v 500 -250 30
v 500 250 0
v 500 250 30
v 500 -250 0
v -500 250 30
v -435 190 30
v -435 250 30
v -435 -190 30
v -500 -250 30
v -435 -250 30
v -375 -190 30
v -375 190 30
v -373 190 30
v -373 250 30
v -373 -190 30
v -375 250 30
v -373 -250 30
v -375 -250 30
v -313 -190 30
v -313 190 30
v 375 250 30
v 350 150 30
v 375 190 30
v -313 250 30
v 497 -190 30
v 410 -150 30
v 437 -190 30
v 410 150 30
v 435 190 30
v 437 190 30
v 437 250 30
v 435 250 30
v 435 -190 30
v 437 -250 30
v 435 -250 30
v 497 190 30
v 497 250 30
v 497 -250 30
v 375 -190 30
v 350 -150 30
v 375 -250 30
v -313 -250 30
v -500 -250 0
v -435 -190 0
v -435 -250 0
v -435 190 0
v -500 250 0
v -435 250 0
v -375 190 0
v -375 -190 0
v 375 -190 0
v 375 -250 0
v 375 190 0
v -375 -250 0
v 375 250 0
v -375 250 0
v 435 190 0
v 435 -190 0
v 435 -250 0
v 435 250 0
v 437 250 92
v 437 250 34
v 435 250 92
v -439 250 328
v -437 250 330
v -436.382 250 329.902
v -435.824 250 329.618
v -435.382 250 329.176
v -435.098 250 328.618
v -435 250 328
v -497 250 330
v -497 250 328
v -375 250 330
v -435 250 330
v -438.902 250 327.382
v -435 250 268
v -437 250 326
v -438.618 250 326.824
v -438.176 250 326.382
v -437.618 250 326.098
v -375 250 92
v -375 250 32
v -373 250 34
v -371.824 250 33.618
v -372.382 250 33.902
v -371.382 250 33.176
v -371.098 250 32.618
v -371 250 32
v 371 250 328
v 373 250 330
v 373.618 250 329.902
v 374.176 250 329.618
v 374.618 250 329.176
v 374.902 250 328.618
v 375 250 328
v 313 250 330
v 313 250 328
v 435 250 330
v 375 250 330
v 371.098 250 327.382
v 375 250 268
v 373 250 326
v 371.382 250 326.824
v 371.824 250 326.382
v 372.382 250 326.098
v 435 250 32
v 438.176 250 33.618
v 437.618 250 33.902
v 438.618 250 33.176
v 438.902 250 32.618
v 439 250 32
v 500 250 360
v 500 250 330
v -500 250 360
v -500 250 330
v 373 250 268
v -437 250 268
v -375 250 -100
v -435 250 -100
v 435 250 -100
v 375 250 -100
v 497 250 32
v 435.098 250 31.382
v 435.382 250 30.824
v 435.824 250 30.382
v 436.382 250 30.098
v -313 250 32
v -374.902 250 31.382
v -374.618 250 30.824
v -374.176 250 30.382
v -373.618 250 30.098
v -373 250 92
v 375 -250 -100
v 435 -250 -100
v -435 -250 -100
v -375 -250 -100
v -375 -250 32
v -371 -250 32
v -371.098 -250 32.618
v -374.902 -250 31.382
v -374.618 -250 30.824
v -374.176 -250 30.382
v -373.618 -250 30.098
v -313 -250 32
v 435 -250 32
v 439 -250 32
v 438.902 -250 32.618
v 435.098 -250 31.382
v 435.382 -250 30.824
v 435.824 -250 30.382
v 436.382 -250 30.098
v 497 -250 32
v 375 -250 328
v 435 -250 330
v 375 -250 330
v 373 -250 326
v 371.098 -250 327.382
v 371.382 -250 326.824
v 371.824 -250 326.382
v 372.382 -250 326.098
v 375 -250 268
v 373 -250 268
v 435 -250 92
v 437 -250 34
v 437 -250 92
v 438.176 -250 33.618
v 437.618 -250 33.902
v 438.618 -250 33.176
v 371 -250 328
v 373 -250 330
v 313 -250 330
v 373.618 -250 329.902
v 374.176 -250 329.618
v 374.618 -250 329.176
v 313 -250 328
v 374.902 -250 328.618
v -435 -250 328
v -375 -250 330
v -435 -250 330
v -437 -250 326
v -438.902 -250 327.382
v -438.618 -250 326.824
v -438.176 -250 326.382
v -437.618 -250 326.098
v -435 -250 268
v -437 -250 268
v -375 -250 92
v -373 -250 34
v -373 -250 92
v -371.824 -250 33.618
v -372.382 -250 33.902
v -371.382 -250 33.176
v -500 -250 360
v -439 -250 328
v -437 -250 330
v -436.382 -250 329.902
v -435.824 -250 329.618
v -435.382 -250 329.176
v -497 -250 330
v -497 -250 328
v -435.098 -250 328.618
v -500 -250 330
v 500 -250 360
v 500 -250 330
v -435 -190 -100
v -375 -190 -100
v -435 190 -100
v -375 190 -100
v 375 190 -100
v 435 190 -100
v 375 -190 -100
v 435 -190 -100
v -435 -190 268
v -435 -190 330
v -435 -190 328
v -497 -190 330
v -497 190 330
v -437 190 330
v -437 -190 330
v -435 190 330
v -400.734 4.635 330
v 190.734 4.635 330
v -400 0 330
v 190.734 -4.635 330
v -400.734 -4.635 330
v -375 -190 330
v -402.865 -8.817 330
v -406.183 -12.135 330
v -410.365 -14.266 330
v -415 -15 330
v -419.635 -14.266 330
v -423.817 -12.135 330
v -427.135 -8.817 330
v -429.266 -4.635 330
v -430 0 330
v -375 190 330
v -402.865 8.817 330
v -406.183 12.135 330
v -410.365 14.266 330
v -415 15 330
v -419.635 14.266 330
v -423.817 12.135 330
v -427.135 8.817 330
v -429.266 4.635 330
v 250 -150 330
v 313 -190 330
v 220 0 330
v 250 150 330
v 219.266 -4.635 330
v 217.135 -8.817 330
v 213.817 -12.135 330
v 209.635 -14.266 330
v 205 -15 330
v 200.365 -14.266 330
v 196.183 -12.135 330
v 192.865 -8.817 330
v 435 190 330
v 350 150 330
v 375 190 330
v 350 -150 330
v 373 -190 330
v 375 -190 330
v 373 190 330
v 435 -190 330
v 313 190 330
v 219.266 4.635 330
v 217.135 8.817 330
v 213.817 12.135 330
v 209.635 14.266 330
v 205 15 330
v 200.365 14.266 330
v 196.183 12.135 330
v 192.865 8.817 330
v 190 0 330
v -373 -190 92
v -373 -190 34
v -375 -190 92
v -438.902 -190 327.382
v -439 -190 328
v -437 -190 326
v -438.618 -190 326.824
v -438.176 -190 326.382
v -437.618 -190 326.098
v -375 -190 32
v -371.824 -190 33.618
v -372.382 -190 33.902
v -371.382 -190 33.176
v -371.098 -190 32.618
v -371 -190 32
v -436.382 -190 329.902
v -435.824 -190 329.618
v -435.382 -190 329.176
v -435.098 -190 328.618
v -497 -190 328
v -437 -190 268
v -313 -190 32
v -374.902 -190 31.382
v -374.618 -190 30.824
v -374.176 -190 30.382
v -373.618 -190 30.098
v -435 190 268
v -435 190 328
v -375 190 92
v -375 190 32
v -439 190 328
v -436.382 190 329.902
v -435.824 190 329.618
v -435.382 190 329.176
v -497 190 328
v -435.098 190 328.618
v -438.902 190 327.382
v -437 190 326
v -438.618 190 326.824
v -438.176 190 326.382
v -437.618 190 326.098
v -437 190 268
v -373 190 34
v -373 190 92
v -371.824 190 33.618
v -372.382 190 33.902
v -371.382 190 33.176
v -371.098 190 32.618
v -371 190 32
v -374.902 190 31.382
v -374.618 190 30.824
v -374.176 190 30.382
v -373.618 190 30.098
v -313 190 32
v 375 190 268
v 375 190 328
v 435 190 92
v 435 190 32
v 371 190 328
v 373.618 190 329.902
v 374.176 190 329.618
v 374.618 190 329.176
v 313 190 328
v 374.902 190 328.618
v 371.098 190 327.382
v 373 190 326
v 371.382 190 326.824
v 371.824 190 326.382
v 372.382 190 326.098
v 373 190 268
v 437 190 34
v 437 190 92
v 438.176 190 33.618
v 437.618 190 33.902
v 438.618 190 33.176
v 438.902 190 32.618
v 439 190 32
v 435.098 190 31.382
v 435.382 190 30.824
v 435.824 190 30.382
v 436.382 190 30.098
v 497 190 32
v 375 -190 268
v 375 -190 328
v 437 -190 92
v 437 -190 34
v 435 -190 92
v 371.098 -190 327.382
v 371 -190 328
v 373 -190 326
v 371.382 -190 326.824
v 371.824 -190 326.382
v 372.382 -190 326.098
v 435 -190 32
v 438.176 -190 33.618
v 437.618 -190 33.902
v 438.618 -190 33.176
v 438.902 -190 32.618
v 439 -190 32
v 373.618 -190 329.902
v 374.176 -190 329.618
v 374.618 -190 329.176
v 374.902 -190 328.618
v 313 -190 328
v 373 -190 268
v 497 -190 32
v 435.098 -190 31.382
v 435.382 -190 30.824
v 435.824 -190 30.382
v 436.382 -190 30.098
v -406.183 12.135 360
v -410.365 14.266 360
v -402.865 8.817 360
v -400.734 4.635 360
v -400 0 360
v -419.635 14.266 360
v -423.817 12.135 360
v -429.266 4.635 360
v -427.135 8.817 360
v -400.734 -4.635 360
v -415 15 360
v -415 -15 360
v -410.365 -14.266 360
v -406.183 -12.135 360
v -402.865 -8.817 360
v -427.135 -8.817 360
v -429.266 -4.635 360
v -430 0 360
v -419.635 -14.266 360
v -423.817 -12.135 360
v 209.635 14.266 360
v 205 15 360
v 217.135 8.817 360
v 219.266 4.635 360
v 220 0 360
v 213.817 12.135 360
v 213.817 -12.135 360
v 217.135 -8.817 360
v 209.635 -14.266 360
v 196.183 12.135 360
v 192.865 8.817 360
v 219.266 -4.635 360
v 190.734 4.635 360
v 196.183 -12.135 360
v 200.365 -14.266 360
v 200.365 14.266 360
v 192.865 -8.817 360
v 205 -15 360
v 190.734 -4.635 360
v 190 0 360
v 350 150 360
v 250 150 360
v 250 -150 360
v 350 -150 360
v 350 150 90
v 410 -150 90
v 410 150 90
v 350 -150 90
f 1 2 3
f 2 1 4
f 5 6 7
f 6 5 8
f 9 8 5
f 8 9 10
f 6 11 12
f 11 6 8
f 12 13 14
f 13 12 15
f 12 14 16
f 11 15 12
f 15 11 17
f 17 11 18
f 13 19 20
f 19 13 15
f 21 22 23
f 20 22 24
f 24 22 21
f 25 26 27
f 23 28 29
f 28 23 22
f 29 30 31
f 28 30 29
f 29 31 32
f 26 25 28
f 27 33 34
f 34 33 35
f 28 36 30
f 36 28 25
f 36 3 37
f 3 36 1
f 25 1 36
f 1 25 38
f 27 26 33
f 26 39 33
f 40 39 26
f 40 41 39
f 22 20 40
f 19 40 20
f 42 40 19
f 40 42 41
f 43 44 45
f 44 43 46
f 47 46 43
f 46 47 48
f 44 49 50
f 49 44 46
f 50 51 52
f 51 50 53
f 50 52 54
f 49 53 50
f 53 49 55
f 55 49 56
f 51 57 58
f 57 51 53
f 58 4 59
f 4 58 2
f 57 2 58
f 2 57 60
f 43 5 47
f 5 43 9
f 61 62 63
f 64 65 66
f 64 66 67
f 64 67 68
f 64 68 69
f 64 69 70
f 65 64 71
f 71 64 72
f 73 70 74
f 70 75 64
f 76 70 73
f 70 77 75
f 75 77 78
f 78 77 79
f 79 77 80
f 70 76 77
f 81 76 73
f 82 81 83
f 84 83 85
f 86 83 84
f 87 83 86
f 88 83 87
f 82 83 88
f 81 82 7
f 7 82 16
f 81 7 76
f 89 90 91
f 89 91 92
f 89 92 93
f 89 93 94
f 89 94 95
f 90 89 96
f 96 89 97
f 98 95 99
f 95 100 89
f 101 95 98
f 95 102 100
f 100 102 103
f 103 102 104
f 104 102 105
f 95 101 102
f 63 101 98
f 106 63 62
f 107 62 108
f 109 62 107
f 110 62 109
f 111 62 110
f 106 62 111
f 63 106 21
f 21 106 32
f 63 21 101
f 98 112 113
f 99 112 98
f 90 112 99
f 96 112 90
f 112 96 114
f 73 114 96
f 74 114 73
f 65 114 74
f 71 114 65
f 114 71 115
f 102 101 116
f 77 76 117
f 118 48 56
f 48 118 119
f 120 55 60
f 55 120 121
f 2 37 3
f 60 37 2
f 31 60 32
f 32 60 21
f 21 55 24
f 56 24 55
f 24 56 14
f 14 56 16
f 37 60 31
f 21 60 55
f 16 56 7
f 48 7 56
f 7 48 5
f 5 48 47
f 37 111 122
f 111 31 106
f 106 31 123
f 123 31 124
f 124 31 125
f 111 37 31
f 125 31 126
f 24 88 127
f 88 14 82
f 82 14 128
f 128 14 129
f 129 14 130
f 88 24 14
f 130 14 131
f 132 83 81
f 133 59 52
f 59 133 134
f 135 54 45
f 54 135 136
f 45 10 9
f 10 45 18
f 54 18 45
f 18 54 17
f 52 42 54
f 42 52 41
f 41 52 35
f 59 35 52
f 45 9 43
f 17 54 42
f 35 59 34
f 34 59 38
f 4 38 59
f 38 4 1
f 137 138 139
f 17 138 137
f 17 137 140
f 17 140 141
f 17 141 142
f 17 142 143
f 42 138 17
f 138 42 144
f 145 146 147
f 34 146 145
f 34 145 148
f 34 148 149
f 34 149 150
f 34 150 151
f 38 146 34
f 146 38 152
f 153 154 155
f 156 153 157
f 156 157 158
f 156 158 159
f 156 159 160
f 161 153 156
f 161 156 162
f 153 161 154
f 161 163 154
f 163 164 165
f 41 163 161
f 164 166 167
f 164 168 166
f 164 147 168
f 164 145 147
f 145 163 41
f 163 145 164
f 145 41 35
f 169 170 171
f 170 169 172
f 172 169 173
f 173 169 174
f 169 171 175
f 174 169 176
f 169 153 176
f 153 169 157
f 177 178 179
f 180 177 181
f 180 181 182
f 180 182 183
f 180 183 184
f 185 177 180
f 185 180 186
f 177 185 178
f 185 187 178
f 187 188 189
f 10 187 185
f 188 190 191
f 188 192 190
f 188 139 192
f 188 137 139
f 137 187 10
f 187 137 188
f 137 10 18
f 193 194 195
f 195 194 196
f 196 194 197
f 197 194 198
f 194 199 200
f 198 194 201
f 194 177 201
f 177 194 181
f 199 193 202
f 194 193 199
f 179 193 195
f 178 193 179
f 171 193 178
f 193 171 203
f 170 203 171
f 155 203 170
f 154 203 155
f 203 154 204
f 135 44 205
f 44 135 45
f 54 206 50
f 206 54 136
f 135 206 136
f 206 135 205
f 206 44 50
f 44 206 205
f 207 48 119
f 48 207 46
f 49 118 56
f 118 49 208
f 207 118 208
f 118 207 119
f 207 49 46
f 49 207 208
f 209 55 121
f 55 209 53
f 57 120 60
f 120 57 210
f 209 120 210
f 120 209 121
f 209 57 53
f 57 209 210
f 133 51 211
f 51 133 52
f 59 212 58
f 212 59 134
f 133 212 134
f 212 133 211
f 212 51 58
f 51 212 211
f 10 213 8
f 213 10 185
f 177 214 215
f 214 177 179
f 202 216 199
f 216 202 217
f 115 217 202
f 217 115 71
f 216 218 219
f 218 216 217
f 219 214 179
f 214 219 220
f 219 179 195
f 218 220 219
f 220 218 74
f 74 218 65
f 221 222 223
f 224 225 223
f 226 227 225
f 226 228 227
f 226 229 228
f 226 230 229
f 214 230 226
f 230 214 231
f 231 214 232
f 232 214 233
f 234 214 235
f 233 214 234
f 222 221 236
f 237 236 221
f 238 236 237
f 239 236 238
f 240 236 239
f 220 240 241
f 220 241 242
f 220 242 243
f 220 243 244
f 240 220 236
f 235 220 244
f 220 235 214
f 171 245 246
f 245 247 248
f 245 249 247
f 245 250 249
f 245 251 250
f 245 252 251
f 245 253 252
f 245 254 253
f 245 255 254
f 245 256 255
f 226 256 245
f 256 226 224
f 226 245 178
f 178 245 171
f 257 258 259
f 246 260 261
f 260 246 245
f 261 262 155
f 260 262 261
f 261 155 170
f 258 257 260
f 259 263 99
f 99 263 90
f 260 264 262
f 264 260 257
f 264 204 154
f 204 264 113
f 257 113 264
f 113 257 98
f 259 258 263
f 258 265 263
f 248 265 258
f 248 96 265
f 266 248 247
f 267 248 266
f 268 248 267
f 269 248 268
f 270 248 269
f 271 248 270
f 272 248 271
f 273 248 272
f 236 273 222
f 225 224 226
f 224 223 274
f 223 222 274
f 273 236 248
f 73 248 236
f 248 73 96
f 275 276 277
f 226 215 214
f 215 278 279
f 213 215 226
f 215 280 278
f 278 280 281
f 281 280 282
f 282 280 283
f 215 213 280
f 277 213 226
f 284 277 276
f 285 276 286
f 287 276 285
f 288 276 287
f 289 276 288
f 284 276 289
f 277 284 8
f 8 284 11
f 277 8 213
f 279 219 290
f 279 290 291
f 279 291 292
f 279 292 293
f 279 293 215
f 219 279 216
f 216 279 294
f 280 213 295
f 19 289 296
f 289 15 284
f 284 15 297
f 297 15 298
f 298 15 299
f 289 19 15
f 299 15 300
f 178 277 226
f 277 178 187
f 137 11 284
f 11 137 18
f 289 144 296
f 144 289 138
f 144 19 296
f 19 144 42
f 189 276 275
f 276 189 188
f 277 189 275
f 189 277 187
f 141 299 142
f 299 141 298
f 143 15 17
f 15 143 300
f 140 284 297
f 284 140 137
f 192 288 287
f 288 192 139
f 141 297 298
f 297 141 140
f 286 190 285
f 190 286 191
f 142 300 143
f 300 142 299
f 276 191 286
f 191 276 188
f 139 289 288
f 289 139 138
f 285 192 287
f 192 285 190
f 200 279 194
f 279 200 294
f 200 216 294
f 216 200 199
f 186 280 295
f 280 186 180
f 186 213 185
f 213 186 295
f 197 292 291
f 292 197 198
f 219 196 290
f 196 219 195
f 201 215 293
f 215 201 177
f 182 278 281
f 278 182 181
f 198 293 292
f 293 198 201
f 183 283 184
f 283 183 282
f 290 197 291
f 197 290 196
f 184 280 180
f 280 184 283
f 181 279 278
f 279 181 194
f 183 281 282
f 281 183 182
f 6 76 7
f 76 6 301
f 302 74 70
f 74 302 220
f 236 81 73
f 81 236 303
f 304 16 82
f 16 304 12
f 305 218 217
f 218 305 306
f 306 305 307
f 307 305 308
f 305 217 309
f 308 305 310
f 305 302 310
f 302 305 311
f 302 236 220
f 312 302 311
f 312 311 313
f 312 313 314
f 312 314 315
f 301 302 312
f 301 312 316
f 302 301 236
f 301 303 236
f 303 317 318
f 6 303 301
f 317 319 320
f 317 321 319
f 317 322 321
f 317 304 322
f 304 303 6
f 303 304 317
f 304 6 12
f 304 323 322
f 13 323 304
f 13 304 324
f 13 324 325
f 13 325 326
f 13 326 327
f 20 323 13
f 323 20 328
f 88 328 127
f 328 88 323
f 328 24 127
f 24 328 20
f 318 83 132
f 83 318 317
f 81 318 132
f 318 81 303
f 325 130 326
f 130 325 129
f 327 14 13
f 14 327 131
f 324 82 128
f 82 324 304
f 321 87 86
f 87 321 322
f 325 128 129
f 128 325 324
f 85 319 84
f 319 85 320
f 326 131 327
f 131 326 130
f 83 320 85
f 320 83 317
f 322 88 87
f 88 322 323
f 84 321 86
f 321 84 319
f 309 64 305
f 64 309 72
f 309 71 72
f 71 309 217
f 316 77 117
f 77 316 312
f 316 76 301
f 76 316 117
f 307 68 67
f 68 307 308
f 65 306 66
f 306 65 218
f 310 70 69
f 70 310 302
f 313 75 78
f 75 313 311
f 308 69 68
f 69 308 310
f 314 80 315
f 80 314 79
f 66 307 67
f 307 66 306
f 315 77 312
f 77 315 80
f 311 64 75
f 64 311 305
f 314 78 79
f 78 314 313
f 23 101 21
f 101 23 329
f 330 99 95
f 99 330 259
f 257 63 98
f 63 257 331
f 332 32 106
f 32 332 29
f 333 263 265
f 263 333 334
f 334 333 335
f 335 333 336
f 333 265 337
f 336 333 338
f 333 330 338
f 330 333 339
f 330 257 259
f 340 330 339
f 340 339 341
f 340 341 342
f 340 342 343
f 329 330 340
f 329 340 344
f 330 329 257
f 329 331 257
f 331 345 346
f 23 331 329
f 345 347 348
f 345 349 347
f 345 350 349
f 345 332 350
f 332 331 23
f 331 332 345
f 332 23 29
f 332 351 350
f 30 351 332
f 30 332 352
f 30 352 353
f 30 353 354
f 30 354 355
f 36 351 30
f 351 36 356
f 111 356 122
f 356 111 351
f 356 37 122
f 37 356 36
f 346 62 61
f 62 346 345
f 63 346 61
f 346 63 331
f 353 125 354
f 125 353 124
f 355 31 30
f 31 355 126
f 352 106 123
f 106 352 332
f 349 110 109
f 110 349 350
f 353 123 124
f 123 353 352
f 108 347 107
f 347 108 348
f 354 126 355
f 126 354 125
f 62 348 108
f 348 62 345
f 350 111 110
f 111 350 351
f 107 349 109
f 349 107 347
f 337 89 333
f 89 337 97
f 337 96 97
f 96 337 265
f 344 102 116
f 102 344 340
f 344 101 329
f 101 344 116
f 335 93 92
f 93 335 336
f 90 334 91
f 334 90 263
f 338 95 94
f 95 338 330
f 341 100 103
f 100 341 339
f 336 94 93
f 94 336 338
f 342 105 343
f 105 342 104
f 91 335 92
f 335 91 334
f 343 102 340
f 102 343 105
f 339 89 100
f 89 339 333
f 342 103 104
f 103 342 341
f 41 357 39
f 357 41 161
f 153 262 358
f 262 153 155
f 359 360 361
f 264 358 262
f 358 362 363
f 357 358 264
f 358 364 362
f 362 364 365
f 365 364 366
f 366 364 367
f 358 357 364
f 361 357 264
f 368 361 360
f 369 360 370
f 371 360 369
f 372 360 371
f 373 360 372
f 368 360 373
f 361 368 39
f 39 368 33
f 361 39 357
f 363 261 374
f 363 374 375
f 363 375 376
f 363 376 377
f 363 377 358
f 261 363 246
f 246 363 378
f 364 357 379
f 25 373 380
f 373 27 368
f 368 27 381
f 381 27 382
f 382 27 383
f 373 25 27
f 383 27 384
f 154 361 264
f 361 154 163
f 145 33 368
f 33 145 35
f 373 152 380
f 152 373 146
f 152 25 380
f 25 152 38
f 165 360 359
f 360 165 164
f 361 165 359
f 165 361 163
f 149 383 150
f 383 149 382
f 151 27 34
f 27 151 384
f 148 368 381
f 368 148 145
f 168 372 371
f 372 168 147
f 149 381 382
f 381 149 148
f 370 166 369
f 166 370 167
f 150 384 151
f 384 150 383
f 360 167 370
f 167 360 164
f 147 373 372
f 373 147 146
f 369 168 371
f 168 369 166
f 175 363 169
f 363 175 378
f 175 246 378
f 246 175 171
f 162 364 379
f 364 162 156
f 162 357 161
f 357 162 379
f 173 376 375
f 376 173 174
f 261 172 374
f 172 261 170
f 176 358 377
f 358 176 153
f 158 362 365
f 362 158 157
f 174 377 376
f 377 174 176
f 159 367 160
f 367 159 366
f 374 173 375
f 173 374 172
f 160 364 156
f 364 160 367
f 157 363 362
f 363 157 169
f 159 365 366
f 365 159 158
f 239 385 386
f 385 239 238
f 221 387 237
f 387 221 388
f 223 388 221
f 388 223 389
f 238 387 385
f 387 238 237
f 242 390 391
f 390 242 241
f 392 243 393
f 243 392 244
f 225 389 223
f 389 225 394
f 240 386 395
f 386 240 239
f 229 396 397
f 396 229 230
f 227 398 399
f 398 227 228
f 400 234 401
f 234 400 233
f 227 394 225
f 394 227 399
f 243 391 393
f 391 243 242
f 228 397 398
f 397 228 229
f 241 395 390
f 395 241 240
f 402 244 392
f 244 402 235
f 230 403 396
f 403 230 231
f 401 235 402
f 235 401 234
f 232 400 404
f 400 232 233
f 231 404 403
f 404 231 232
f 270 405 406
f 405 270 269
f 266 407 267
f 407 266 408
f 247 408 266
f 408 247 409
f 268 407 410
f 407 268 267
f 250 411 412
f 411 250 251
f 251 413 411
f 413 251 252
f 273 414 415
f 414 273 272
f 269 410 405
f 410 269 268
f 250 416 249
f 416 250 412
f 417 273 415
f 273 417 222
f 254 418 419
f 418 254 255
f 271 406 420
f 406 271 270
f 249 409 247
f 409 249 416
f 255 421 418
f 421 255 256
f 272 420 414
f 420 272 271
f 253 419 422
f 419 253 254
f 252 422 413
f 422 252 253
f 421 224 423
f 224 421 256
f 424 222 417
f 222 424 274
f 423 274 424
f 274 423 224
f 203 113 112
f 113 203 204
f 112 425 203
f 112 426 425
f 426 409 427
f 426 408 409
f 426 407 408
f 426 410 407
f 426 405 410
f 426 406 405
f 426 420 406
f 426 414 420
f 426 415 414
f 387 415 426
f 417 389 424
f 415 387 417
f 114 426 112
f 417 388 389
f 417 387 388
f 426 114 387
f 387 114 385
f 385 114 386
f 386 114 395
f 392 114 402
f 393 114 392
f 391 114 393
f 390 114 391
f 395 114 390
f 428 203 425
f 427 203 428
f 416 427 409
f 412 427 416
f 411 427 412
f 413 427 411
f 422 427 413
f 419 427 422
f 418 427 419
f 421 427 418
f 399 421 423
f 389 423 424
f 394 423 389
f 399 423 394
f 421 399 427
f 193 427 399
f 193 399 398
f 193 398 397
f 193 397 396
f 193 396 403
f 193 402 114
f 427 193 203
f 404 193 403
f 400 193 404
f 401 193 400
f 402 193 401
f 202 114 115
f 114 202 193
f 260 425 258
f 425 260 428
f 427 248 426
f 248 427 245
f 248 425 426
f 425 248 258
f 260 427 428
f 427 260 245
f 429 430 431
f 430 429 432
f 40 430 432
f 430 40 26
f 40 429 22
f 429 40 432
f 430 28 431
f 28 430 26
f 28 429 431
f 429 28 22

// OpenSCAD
/**
 * \file closingMechanism.scad
 *
 * This file contains the demonstration of the closing mechanism of the skiDryer
 */

// Including the pieces. We use include because we need to use also the
// constants defined in the file
include <pieces.scad>;

/**
 * \brief The vertical distance between the axes of the two hinges for each
 *        upper leg when the skiDryer is open
 */
sd_upperLegHingesAxesVerticalDistance = sd_basesDistance - 2 * sd_hingeThickness;

/**
 * \brief The horizontal distance between the axes of the two hinges for each
 *        upper leg when the skiDryer is closed
 */
sd_upperLegHingesAxesHorizontalDistance = sd_legWidth + 2 * sd_hingeThickness;

/**
 * \brief The distance between the axes of the two hinges for each upper leg
 */
sd_upperLegHingesAxesDistance = sqrt(pow(sd_upperLegHingesAxesHorizontalDistance, 2) + pow(sd_upperLegHingesAxesVerticalDistance, 2));

/**
 * \brief The angle of the line connecting the axes of the two hinges with the
 *        base
 */
sd_upperLegHingesAxesAngle = asin(sd_upperLegHingesAxesVerticalDistance / sd_upperLegHingesAxesDistance);

/**
 * \brief Computes the vertical distance of the two bases at the given angle
 *
 * \param angle the angle of the closing mechanism (0 means open and the
 *              distance is equal to sd_basesDistance, 90 means closed)
 */
function sd_basesVerticalDistanceAtAngle(angle) = (2 * sd_hingeThickness) + (sd_upperLegHingesAxesDistance * sin(angle + sd_upperLegHingesAxesAngle));

/**
 * \brief Computes the horizontal displacement of the two bases at the given
 *        angle
 *
 * \param angle the angle of the closing mechanism (0 means open and the
 *              displacement is 0, 90 means closed)
 */
function sd_basesHorizontalDisplacementAtAngle(angle) = sd_upperLegHingesAxesHorizontalDistance - (sd_upperLegHingesAxesDistance * cos(angle + sd_upperLegHingesAxesAngle));

/**
 * \brief Computes the position of the center of the upper base given the angle
 *
 * This function returna a vector of three elements being the position of the
 * lower part of the upper base depending on the closing mechanism angle and the
 * position of center of the upper part of the lower base.
 * \param angle the angle of the closing mechanism
 * \param lowerBasePos the position of the center of the upper part of the lower
 *                     base
 * \param rotateAroundX if true the closing mechanism for the legs rotates
 *                      around the x axis, if false around the y axis
 */
function sd_upperBasePosition(angle, lowerBasePos, rotateAroundX) = lowerBasePos + [
	(rotateAroundX == true) ? 0 : sd_basesHorizontalDisplacementAtAngle(angle),
	(rotateAroundX == true) ? -sd_basesHorizontalDisplacementAtAngle(angle) : 0,
	sd_basesVerticalDistanceAtAngle(angle)];

/**
 * \brief Returns the position of the leg along the rotation axis of the closing
 *        mechanism
 *
 * The leg is identified by a parameter p which can be either 1 or -1. If other
 * values are used the placement will be incorrect
 * \param p the parameter identifying the leg
 * \param rotateAroundX if true the closing mechanism for the legs rotates
 *                      around the x axis, if false around the y axis
 */
function sd_legPositionAlongRotationAxis(p, rotateAroundX) = p * ((((rotateAroundX == true) ? sd_baseWidth : sd_baseDepth) - sd_legWidth) / 2 - sd_legsDistanceFromBorderAlongRotationAxis);

/**
 * \brief Returns the position of the leg along the axis perpendicular to the
 *        rotation axis of the closing mechanism
 *
 * The leg is identified by a parameter p which can be either 1 or -1. If other
 * values are used the placement will be incorrect
 * \param p the parameter identifying the leg
 * \param rotateAroundX if true the closing mechanism for the legs rotates
 *                      around the x axis, if false around the y axis
 */
function sd_legPositionAlongNonRotationAxis(p, rotateAroundX) = p * ((((rotateAroundX == true) ? sd_baseDepth : sd_baseWidth) - sd_legWidth) / 2 - sd_legsDistanceFromBorderAlongNonRotationAxis);

/**
 * \brief Returns the position of the center of a leg when the skiDryer is open
 *
 * This function returns the position of the center of a leg when the skiDryer
 * is open (this is also the position of the lower legs). A leg is identified by
 * a couple [p0, p1] with both p0 and p1 being either -1 or 1 (other values will
 * lead to an incorrect placement). This function only actually computes the x
 * and y position. The z position is passed as a parameter and is retuned as is.
 * \param p the couple of values identifying the leg (see function description)
 * \param rotateAroundX if true the closing mechanism for the legs rotates
 *                      around the x axis, if false around the y axis
 * \param z the position along z
 */
function sd_legPosition(p, rotateAroundX, z) = [
	(rotateAroundX == true) ? sd_legPositionAlongRotationAxis(p[0], rotateAroundX) : sd_legPositionAlongNonRotationAxis(p[0], rotateAroundX),
	(rotateAroundX == true) ? sd_legPositionAlongNonRotationAxis(p[1], rotateAroundX) : sd_legPositionAlongRotationAxis(p[1], rotateAroundX),
	z];

/**
 * \brief Returns the position of the center of an upper leg
 *
 * This function is like the one above but also takes into account the angle of
 * the closing mechanism
 * \param p the couple of values identifying the leg (see sd_legPosition
 *          function description)
 * \param rotateAroundX if true the closing mechanism for the legs rotates
 *                      around the x axis, if false around the y axis
 */
function sd_upperLegPosition(p, rotateAroundX) = sd_legPosition(p, rotateAroundX, sd_planesThickness + sd_upperLegsDisplacement[2] / 2) + (
	(rotateAroundX == true) ?
	[0, sd_upperLegsDisplacement[1] / 2, 0] :
	[sd_upperLegsDisplacement[0] / 2, 0, 0]);

/**
 * \brief Returns the position of an hinge on the lower base
 *
 * This function returns the position of an hinge on the lower base. The hinge
 * is identified by a couple [p0, p1] with both p0 and p1 being either -1 or 1
 * (other values will lead to an incorrect placement)
 * \param p the couple of values identifying the hinge (see function
 *          description)
 * \param rotateAroundX if true the closing mechanism for the legs rotates
 *                      around the x axis, if false around the y axis
 */
function sd_upperLegLowerBaseHingePosition(p, rotateAroundX) = [
	(rotateAroundX == true) ?
		p[0] * (sd_baseWidth / 2 - sd_legWidth / 2 - sd_legsDistanceFromBorderAlongRotationAxis) :
		p[0] * (sd_baseWidth / 2 - sd_legsDistanceFromBorderAlongNonRotationAxis) + sd_hingeThickness + ((1 - p[0]) / 2) * sd_legWidth,
	(rotateAroundX == true) ?
		p[1] * (sd_baseDepth / 2 - sd_legsDistanceFromBorderAlongNonRotationAxis) - sd_hingeThickness - ((p[1] + 1) / 2) * sd_legWidth :
		p[1] * (sd_baseDepth / 2 - sd_legWidth / 2 - sd_legsDistanceFromBorderAlongRotationAxis),
	sd_planesThickness + sd_hingeThickness];

/**
 * \brief Returns the position of an hinge on the upper base
 *
 * This function returns the position of an hinge on the upper base. The hinge
 * is identified by a couple [p0, p1] with both p0 and p1 being either -1 or 1
 * (other values will lead to an incorrect placement)
 * \param p the couple of values identifying the hinge (see function
 *          description)
 * \param rotateAroundX if true the closing mechanism for the legs rotates
 *                      around the x axis, if false around the y axis
 */
function sd_upperLegUpperBaseHingePosition(p, rotateAroundX) = [
	(rotateAroundX == true) ?
		p[0] * (sd_baseWidth / 2 - sd_legWidth / 2 - sd_legsDistanceFromBorderAlongRotationAxis) :
		p[0] * (sd_baseWidth / 2 - sd_legsDistanceFromBorderAlongNonRotationAxis) - sd_hingeThickness - ((p[0] + 1) / 2) * sd_legWidth + sd_upperLegsDisplacement[0],
	(rotateAroundX == true) ?
		p[1] * (sd_baseDepth / 2 - sd_legsDistanceFromBorderAlongNonRotationAxis) + sd_hingeThickness + ((1 - p[1]) / 2) * sd_legWidth + sd_upperLegsDisplacement[1] :
		p[1] * (sd_baseDepth / 2 - sd_legWidth / 2 - sd_legsDistanceFromBorderAlongRotationAxis),
	sd_planesThickness + sd_upperLegsDisplacement[2] - sd_hingeThickness];

/**
 * \brief Creates the lower part, the one interested by the closing mechanism
 *
 * This construction lacks the aluminium bars to hang stuffs.
 * \param angle the angle of the hinges. 0 means open, 90 means closed (this is
 *              the angle of the leg with the perpendicular to the lower base)
 * \param rotateAroundX if true the leg rotate around the x axis, otherwise
 *                      around the y axis
 */
module sd_closingMechanism(angle = 90, rotateAroundX) {
	// Checking the angle is valid
	if ((angle < 0) || (angle > 90)) {
		echo("Wrong angle for che closing mechanism");
	} else {
		// Placing the lower base with the lower part on the xy plane
		translate(sd_lowerBaseLowerFacePos + [0, 0, sd_planesThickness / 2]) {
			sd_lowerBase();
		}

		// Placing the lower legs
		for (p = [[-1, -1], [-1, 1], [1, 1], [1, -1]]) {
			translate(sd_legPosition(p, rotateAroundX, -sd_heightFromGround / 2)) {
				sd_lowerLeg();
			}
		}

		// Placing the legs between the lower and upper base and the hinges
		for (p = [[-1, -1], [-1, 1], [1, 1], [1, -1]]) {
			// Placing leg
			translate(sd_upperLegPosition(p, rotateAroundX)) {
				sd_upperLeg(angle, rotateAroundX);
			}

			// Placing the hinge on the lower base
			translate(sd_upperLegLowerBaseHingePosition(p, rotateAroundX)) {
				sd_upperLegLowerBaseHinge(90 - angle, rotateAroundX);
			}

			// Placing the hinge on the upper base
			translate(sd_upperLegUpperBaseHingePosition(p, rotateAroundX)) {
				sd_upperLegUpperBaseHinge(90 - angle, rotateAroundX);
			}
		}

		// Placing the upper base
		translate(sd_upperBaseLowerFacePos + [0, 0, sd_planesThickness / 2]) {
			sd_upperBase();
		}

		// Now putting the lower ski support on the lower base
		translate([sd_skiHolePos + sd_skiHoleWidth / 2 + sd_lowerSkiSupportSide / 2, 0, sd_planesThickness + sd_lowerSkiSupportSide / 2]) {
			sd_mainAxis("y") {
				sd_lowerSkiSupport();
			}
		}

// AGGIUNGERE SUPPORTI PER LE VERTICAL BAR
	}
}

/**
 * \brief Whether the rotation mechanism rotates around the x or y axis
 */
sd_rotateAroundX = false;

/**
 * \brief The angle of the closing mechanism
 */
sd_closingMechanismAngle = 90 * $t;

/**
 * \brief The position of the lower part of the lower base
 */
sd_lowerBaseLowerFacePos = [0, 0, 0];

/**
 * \brief The position of the lower part of the upper base
 */
sd_upperBaseLowerFacePos = sd_upperBasePosition(sd_closingMechanismAngle, sd_lowerBaseLowerFacePos + [0, 0, sd_planesThickness], sd_rotateAroundX);

/**
 * \brief The displacement of the center of upper legs due to the position of
 *        the closing mechanism
 */
sd_upperLegsDisplacement = sd_upperBaseLowerFacePos - (sd_lowerBaseLowerFacePos + [0, 0, sd_planesThickness]);

// Creating the assembly
sd_closingMechanism(sd_closingMechanismAngle, sd_rotateAroundX);
